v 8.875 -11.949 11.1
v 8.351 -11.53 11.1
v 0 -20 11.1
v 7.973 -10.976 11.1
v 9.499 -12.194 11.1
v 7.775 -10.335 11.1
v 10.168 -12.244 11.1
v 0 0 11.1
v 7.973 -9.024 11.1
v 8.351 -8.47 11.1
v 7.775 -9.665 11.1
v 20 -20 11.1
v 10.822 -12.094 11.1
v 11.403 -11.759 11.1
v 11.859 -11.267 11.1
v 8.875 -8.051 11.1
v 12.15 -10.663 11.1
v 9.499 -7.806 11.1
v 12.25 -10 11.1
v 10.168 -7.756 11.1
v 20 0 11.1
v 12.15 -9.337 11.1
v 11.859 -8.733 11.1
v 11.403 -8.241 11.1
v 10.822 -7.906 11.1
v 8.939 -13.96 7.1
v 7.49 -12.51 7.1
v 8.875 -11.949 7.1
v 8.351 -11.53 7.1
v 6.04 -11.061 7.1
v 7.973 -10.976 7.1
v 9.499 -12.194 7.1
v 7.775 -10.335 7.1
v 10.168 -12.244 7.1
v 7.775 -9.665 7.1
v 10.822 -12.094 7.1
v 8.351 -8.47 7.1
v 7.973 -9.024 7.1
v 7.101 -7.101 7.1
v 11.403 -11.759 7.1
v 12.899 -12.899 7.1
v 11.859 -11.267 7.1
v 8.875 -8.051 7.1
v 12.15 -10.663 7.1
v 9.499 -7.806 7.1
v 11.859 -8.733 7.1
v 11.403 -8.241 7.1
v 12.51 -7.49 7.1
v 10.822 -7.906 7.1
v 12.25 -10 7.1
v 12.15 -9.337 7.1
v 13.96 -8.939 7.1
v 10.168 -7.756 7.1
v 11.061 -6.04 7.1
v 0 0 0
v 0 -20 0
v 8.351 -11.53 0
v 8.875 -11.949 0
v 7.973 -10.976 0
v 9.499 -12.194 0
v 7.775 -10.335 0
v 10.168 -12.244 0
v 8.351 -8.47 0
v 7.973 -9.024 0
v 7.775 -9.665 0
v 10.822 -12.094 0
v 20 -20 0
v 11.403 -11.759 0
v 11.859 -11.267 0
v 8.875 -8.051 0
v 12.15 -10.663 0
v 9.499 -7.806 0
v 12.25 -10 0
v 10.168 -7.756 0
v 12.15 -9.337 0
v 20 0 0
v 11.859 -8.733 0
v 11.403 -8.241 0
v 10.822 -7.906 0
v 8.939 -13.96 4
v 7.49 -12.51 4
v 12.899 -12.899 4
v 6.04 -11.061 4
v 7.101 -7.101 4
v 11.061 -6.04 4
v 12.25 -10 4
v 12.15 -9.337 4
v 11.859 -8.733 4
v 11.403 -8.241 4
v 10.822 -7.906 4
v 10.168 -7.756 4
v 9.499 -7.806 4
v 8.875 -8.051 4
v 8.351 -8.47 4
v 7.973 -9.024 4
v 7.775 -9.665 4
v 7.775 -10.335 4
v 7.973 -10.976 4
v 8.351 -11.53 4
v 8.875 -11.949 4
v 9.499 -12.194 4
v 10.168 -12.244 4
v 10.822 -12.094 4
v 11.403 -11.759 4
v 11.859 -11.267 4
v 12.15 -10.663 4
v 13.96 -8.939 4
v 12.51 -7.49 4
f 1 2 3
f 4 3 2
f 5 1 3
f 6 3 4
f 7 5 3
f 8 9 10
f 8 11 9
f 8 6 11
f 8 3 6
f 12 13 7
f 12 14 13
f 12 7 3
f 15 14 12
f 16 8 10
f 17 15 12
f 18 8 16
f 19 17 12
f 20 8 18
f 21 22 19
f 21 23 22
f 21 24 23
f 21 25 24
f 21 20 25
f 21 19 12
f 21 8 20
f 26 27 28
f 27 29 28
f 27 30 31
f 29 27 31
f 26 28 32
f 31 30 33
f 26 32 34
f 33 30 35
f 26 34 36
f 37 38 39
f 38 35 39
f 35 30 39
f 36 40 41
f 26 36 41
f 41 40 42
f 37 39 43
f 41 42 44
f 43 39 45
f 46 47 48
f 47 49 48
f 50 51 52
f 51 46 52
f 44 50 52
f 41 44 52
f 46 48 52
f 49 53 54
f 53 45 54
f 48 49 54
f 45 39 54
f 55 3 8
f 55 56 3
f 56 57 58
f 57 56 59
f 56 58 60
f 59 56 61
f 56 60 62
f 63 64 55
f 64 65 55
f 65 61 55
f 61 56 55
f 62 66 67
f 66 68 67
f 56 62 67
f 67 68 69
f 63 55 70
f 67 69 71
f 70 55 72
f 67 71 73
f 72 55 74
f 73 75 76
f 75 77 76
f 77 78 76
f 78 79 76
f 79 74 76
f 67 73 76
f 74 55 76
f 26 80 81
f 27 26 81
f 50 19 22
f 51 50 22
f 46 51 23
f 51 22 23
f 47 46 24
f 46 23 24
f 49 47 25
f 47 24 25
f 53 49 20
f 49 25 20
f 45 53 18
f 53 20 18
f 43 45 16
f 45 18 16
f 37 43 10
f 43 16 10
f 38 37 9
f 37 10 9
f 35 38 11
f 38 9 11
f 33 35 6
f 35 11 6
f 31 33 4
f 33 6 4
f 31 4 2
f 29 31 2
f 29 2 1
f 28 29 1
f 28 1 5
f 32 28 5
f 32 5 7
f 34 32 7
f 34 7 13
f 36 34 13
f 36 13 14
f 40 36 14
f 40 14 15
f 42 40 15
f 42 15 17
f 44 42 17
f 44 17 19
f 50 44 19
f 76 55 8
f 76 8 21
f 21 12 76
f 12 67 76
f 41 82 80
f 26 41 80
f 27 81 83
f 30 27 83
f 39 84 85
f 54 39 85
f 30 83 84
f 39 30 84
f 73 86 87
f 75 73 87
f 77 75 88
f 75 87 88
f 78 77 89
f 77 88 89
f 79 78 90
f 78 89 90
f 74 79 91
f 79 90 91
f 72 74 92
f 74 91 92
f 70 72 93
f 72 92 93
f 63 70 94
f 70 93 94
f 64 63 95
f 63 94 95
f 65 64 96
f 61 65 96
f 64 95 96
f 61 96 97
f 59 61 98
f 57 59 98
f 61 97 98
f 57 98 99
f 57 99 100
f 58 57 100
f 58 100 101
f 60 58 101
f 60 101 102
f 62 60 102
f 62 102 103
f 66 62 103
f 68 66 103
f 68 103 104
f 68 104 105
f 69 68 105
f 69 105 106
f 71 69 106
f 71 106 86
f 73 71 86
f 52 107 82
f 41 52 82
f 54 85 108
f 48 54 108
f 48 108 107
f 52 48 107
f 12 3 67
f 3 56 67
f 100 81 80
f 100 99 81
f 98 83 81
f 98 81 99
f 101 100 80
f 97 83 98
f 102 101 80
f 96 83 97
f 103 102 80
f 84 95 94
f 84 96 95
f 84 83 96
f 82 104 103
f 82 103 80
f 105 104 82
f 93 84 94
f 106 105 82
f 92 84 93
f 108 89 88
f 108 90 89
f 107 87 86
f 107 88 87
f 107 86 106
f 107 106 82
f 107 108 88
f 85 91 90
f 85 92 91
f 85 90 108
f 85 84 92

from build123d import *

# Parameters (mm, degrees)
F0_W     = 20
F0_H     = 20
F1_DEPTH = 4
F3_DEPTH = 3.1
F4_W     = 20
F4_H     = 20
F5_DEPTH = 4
F6_R     = 2.25
F7_DEPTH = 25


with BuildPart() as f1:
    # F0 (on Top) → F1 (new body)
    with BuildSketch(Plane.XY):
        with Locations((10, -10)):
            Rectangle(F0_W, F0_H)
    extrude(amount=F1_DEPTH)

    # F2 (on face) → F3 (join)
    with BuildSketch(Plane.XY.offset(4)):
        Polygon((20, 0), (0, 0), (7.101437, -7.101437), (11.060948, -6.040489), (12.510229, -7.489771), align=None)
        Polygon((12.898563, -12.898563), (20, -20), (20, 0), (12.510229, -7.489771), (13.959511, -8.939052), align=None)
        Polygon((0, 0), (0, -20), (7.489771, -12.510229), (6.040489, -11.060948), (7.101437, -7.101437), align=None)
        Polygon((7.489771, -12.510229), (0, -20), (20, -20), (12.898563, -12.898563), (8.939052, -13.959511), align=None)
    extrude(amount=F3_DEPTH)

    # F4 (on face) → F5 (join)
    with BuildSketch(Plane.XY.offset(7.1)):
        with Locations((10, -10)):
            Rectangle(F4_W, F4_H)
    extrude(amount=F5_DEPTH)

    # F6 (on face) → F7 (cut)
    with BuildSketch(Plane.XY.offset(11.1)):
        with Locations((10, -10)):
            Circle(F6_R)
    extrude(amount=-F7_DEPTH, mode=Mode.SUBTRACT)


solid = f1.part
